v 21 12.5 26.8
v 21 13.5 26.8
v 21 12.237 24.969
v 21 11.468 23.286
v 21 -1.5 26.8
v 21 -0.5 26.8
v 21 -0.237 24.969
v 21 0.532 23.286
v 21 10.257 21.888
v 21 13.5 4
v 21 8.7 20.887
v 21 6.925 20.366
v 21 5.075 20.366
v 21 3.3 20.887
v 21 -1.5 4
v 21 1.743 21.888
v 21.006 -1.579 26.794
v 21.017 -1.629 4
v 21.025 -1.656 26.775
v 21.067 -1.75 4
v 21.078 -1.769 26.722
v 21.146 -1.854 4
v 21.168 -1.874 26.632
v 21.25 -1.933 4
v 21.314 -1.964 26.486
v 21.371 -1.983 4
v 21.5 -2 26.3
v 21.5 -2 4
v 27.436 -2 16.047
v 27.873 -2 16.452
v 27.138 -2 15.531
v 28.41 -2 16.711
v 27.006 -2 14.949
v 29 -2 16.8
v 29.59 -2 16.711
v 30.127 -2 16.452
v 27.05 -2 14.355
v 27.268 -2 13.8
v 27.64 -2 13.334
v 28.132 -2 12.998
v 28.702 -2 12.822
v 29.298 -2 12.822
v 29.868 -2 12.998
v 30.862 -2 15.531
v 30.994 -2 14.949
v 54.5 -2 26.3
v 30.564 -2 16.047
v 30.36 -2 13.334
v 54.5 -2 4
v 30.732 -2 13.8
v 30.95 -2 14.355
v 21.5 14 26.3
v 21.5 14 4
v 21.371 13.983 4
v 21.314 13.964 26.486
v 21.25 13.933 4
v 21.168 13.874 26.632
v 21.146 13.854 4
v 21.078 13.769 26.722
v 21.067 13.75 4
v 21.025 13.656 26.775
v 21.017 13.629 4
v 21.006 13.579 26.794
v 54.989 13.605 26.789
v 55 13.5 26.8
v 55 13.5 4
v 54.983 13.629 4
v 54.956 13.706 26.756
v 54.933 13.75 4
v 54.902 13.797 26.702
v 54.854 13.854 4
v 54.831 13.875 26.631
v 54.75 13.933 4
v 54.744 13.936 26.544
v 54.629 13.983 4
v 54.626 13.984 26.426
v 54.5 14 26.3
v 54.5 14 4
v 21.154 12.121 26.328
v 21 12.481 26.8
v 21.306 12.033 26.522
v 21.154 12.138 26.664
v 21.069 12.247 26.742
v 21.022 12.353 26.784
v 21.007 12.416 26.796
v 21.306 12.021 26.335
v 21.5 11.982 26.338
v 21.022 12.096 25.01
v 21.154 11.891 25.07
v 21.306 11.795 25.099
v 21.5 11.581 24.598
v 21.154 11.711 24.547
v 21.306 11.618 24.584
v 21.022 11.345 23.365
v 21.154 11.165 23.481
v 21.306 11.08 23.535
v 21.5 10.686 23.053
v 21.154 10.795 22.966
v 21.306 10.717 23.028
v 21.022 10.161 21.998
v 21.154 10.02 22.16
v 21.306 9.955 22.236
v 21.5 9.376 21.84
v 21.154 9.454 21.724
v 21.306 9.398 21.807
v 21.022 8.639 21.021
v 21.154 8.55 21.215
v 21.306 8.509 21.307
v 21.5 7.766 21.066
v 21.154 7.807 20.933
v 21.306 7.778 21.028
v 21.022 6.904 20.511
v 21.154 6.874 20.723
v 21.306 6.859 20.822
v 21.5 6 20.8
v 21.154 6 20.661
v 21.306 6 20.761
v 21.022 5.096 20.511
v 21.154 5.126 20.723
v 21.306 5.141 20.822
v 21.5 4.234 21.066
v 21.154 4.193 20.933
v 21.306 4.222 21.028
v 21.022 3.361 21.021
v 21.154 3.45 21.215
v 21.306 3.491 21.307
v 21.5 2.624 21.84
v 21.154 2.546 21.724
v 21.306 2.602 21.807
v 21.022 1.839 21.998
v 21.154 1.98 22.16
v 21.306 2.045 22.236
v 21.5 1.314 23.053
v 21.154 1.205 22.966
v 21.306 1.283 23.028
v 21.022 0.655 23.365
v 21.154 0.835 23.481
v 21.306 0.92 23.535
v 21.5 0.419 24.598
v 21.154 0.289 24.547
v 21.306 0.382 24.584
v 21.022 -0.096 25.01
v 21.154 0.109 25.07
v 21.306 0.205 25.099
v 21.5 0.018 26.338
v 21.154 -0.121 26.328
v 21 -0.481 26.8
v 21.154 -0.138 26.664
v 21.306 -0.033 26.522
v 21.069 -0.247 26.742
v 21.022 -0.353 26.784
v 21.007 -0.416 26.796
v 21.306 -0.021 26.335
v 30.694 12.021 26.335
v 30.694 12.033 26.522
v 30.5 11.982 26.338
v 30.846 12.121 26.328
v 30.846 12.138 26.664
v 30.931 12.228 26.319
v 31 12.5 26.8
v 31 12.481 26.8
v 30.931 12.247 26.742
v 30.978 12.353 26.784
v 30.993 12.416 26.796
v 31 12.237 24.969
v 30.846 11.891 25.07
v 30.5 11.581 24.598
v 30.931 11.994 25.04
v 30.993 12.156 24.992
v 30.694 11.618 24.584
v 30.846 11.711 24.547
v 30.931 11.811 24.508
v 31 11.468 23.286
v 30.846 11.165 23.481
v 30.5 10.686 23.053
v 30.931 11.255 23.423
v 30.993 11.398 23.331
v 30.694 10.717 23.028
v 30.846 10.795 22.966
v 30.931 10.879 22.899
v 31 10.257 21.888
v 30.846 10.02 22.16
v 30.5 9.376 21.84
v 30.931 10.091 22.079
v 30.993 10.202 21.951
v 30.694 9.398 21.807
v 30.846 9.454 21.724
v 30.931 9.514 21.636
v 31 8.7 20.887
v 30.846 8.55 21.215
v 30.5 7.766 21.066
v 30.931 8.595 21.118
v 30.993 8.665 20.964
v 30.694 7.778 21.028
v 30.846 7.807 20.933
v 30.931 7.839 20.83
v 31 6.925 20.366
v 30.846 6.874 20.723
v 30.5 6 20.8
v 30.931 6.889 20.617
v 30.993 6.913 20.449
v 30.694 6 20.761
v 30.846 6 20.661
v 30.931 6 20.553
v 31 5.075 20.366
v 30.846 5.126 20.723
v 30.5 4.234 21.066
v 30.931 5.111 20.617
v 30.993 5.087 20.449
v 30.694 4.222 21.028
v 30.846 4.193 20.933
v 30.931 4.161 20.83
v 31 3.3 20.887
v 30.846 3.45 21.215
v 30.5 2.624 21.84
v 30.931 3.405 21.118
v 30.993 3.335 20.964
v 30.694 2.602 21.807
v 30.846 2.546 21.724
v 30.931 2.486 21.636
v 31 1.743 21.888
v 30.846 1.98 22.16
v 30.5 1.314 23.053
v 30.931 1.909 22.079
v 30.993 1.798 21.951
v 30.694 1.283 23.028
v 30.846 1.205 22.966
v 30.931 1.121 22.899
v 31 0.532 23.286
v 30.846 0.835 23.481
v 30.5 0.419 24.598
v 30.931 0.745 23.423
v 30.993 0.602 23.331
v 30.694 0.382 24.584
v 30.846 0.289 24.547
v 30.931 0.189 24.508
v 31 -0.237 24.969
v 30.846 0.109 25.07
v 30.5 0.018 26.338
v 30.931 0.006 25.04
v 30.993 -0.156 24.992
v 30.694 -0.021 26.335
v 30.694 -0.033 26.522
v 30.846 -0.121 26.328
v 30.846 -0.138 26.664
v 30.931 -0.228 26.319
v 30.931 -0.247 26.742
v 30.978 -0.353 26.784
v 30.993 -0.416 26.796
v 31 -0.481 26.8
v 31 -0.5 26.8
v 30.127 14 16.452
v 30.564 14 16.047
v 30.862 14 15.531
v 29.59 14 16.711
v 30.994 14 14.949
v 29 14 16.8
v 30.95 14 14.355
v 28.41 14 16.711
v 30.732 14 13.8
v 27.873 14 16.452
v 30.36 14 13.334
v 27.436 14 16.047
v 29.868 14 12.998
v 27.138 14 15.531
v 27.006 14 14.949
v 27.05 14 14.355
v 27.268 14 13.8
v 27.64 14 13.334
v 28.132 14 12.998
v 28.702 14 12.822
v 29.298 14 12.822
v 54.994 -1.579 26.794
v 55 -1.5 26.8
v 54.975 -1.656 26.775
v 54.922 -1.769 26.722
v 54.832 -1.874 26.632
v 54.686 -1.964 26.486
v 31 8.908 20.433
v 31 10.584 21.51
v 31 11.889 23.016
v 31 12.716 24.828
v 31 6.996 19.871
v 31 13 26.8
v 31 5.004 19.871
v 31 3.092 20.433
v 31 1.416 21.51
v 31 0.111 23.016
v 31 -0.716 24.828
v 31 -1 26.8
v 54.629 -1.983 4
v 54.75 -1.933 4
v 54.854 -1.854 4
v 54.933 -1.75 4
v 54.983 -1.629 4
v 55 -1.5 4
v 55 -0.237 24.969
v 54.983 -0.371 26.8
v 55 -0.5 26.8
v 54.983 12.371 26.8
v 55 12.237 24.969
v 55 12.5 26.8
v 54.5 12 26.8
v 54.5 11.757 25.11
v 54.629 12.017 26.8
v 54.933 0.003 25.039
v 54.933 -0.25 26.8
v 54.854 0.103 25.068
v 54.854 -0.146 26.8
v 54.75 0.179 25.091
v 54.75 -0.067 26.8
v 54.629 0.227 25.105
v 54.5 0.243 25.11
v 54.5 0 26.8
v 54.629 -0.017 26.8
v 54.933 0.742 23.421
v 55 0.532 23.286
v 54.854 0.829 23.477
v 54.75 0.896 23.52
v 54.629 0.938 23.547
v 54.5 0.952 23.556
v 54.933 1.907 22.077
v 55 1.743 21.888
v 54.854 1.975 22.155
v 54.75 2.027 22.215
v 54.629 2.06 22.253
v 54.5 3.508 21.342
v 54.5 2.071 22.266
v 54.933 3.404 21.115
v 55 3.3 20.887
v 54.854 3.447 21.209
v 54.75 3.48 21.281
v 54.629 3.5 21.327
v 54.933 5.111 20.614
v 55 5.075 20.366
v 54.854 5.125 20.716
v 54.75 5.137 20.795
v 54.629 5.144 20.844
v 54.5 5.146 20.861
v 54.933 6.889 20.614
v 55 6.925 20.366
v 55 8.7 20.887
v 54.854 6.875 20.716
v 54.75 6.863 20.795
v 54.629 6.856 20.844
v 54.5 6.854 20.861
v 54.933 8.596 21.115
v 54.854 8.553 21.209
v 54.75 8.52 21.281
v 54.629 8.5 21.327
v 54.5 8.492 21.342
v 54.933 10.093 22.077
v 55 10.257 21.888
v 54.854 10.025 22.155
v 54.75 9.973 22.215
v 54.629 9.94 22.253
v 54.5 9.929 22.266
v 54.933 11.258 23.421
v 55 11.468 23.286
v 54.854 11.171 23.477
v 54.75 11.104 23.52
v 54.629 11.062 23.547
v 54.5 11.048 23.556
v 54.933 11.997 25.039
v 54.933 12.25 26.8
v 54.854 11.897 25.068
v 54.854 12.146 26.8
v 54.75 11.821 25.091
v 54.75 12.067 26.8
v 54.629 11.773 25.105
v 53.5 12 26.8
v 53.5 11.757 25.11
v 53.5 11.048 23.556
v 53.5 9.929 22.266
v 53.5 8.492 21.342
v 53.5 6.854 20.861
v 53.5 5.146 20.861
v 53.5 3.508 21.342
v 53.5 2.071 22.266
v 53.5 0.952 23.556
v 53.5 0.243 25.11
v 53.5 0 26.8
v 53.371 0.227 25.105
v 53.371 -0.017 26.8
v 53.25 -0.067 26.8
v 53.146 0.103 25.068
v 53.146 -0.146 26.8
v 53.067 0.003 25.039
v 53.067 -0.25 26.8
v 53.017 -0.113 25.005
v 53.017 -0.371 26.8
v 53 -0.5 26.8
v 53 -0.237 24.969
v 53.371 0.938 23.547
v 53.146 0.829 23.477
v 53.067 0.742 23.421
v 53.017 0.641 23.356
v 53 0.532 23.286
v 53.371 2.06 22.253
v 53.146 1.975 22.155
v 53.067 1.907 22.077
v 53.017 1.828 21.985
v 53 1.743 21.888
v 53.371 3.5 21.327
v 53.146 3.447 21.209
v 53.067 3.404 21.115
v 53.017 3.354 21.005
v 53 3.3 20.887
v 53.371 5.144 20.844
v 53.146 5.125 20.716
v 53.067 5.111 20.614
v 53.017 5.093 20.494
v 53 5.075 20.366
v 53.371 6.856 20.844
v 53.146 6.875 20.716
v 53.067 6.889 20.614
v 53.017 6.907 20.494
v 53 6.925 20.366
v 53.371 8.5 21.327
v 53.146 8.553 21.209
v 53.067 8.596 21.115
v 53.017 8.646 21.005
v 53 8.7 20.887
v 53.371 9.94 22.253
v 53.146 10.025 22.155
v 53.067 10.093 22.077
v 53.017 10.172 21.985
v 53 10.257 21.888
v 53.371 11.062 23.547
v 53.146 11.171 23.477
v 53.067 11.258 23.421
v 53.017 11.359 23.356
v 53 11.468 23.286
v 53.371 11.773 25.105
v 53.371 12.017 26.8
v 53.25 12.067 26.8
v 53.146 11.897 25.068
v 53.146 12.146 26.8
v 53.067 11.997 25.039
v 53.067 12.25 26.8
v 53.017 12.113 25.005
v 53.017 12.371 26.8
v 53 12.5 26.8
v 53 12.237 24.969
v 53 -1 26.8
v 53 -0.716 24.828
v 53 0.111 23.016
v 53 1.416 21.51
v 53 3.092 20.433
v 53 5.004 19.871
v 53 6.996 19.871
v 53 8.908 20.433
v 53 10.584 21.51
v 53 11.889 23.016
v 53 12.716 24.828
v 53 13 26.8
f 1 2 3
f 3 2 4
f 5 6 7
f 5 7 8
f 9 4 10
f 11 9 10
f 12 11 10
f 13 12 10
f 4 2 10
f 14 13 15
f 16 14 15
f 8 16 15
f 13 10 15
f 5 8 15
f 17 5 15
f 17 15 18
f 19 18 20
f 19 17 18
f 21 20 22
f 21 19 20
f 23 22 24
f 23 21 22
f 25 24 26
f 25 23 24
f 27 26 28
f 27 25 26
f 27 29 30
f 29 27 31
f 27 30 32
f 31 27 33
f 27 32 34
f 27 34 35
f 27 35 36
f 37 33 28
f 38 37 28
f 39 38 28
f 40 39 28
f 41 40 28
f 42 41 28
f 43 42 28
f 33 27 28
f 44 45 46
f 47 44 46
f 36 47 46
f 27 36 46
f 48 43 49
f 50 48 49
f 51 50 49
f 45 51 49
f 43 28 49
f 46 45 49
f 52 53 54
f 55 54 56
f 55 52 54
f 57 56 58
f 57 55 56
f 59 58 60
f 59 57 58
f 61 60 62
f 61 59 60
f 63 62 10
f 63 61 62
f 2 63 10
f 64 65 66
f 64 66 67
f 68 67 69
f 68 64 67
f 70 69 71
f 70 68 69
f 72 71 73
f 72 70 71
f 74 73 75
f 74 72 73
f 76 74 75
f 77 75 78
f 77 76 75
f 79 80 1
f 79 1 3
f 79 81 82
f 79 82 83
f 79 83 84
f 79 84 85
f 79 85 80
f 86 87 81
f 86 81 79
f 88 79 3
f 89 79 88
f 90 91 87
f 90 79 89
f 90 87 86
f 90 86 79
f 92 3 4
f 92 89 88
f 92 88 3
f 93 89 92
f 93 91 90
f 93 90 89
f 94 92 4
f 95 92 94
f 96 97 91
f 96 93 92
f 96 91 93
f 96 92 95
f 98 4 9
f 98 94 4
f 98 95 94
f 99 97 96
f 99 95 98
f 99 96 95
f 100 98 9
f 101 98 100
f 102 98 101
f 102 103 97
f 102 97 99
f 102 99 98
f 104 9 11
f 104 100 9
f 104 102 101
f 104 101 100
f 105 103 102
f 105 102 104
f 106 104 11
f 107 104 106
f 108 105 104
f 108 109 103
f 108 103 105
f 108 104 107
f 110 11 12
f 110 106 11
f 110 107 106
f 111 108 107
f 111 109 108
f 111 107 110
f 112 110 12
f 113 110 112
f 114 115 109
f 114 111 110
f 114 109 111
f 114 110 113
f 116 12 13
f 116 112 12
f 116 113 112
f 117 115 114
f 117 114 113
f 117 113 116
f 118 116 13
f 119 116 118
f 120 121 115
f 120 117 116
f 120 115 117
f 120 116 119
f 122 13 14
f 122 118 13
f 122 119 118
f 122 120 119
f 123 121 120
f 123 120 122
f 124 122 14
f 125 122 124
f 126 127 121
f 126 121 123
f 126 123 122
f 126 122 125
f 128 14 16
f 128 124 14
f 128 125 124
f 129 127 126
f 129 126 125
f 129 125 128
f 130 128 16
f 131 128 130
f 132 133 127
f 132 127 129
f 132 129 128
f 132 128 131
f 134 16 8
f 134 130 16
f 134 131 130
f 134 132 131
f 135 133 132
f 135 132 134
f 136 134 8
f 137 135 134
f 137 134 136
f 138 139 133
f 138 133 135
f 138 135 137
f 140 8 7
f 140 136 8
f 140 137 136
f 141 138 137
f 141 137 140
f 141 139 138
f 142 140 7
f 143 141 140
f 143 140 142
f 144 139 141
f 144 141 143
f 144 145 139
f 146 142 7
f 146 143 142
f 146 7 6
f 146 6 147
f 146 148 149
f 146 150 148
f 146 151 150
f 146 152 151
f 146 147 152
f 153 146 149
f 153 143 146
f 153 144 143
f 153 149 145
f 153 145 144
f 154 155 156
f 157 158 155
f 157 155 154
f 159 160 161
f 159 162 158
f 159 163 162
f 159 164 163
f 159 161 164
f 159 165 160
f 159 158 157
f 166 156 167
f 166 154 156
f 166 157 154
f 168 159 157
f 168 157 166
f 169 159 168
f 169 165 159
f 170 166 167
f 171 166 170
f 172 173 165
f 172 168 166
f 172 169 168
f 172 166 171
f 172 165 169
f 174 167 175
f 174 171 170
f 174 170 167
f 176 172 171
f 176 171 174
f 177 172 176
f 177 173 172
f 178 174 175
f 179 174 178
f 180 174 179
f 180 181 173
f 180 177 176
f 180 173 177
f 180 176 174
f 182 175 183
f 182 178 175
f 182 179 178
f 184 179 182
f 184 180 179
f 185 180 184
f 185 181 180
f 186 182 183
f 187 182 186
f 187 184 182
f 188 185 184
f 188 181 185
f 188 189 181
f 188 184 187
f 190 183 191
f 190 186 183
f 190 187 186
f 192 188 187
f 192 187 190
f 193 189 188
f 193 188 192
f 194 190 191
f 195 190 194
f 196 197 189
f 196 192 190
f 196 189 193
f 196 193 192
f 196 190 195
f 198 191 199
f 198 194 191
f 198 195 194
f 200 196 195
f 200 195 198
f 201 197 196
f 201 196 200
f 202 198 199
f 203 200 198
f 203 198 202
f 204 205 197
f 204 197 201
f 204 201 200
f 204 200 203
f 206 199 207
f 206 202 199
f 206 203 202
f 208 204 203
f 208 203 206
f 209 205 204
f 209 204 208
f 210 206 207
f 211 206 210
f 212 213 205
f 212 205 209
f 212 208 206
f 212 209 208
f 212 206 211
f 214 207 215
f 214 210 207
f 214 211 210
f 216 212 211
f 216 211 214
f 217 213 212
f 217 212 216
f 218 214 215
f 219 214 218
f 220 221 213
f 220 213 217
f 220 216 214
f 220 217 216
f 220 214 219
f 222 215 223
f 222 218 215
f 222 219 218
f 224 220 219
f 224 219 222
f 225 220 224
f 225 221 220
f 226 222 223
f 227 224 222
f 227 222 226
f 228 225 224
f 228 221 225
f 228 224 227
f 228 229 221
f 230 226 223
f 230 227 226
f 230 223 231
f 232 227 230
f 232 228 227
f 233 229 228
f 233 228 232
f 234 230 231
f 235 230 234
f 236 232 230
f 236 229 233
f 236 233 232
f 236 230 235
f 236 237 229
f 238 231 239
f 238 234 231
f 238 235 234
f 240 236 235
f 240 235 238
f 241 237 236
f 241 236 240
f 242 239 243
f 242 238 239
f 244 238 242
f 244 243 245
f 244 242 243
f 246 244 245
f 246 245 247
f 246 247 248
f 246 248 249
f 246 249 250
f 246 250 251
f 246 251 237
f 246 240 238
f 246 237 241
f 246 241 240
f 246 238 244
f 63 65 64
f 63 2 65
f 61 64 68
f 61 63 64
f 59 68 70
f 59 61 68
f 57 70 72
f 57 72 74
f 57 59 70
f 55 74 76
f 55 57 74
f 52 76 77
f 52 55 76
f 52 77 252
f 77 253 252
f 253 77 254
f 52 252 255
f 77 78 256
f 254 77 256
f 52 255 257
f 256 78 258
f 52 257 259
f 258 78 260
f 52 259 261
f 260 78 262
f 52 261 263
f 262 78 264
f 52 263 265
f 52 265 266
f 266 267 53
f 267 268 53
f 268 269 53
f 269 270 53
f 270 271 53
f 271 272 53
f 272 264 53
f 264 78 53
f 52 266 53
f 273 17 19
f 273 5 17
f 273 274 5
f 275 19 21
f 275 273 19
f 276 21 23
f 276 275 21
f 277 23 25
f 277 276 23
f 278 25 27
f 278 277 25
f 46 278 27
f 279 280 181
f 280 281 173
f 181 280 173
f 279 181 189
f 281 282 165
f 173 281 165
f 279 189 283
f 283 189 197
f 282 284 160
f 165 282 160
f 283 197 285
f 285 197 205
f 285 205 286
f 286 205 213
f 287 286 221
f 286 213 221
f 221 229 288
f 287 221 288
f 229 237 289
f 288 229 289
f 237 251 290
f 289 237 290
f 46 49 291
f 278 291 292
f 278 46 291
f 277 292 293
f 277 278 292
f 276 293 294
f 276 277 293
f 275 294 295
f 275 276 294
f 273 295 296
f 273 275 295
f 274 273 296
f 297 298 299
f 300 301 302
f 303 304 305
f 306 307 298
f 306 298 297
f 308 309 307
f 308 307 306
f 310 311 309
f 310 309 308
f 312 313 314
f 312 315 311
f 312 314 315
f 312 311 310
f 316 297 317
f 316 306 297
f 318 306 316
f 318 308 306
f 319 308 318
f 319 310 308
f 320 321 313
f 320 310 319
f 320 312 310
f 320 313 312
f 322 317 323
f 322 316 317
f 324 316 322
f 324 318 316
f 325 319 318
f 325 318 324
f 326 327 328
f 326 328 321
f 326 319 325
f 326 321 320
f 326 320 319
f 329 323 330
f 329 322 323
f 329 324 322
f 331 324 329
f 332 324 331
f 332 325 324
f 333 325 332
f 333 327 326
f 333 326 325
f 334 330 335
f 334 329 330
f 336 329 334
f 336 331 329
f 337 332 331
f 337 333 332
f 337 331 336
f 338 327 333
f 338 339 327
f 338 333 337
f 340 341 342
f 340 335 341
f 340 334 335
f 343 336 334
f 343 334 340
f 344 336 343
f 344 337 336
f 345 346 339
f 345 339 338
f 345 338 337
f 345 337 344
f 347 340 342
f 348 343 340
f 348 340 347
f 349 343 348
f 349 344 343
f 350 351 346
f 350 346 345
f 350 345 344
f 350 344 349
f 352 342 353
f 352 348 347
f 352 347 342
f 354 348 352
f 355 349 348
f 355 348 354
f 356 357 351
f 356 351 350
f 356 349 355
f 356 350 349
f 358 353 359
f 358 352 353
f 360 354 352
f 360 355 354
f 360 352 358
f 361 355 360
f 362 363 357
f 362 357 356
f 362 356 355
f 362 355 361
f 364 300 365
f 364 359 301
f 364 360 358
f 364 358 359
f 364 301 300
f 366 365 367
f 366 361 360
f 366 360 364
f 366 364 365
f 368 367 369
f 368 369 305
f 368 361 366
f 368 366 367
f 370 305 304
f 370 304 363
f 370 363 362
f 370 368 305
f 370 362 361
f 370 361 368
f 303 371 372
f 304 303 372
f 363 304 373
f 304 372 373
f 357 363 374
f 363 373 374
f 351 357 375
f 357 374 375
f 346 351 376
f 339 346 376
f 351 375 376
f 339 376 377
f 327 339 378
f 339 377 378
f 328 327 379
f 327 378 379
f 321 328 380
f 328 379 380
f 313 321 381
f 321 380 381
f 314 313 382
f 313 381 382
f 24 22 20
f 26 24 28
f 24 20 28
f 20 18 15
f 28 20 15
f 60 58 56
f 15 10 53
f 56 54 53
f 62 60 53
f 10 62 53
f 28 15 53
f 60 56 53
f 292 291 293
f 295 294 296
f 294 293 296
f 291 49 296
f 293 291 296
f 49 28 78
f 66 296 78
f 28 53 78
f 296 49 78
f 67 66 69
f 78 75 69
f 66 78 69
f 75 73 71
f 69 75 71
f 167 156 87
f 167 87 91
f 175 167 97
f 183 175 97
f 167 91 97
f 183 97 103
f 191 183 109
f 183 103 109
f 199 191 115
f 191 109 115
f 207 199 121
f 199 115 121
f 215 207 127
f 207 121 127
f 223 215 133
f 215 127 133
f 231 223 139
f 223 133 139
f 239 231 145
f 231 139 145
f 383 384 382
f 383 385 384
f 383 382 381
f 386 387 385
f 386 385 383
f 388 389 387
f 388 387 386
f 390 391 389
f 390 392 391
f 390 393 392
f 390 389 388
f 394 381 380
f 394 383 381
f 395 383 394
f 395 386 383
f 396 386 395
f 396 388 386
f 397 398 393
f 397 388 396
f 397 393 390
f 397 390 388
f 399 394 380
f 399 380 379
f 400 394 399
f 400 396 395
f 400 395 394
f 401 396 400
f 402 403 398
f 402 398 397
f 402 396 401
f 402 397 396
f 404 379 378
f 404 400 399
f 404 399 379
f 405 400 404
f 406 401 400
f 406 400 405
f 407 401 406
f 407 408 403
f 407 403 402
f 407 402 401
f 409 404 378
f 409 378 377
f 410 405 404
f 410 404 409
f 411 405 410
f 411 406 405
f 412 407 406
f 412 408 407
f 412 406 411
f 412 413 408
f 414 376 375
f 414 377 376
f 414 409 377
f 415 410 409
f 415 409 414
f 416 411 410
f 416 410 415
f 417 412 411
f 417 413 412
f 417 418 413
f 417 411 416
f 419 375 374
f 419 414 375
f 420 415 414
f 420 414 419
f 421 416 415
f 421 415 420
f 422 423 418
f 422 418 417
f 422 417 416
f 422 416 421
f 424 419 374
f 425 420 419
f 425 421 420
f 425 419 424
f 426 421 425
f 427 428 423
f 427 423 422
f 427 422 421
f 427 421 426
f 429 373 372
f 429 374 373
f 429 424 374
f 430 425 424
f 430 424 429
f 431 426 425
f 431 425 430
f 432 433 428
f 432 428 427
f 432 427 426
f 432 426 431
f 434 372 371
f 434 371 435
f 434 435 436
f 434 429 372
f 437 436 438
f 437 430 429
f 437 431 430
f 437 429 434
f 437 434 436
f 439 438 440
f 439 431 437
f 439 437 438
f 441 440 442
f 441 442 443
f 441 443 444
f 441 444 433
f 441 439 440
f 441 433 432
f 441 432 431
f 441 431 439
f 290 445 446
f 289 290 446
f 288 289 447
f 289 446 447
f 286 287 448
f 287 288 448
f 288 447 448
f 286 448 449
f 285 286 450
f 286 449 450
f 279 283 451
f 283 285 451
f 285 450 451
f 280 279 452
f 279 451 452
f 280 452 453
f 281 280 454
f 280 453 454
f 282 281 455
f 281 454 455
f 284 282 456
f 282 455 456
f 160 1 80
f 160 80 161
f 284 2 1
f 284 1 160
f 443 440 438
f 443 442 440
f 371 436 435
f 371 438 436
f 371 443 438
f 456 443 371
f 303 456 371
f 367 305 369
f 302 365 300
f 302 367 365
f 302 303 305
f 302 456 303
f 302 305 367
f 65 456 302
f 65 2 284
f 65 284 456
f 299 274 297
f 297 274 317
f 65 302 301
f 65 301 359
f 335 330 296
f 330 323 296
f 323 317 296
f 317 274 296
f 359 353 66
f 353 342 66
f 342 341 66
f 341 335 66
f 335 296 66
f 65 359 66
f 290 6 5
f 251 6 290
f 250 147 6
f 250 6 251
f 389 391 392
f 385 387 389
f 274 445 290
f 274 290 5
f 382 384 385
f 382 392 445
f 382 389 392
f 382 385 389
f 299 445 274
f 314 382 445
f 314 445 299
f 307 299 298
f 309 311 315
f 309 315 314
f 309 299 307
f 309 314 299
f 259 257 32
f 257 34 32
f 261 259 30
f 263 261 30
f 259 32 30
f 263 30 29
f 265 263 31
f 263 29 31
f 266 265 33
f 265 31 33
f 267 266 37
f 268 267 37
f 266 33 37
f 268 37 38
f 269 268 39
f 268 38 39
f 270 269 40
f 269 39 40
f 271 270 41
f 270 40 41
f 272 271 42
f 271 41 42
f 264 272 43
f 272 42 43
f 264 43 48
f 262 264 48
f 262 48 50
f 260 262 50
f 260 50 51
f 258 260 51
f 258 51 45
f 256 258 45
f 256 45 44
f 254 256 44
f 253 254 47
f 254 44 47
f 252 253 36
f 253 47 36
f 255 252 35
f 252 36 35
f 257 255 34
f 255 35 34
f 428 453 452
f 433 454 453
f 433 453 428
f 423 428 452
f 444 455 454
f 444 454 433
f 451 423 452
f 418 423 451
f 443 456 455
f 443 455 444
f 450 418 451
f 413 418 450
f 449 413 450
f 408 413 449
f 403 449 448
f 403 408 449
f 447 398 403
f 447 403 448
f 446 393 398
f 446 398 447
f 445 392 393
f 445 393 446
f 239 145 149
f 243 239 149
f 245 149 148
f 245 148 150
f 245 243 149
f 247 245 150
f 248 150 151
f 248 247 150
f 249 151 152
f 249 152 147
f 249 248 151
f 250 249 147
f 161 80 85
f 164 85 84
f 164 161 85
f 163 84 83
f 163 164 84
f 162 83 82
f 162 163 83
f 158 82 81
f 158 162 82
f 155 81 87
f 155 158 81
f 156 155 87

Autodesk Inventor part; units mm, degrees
ref_plane "YZ Plane" through (0, 0, 0) normal (1, 0, 0) x (0, 1, 0)
ref_plane "XZ Plane" through (0, 0, 0) normal (0, 1, 0) x (-1, 0, 0)
ref_plane "Work Plane1" through (55, -127.943, -12.5) normal (1, 0, 0) x (0, 0, -1)
ref_plane "Work Plane2" through (2, 0, 0) normal (1, 0, 0) x (0, 1, 0)
ref_plane "Work Plane8" through (55, 3.2, 4) normal (0, 0, 1) x (1, 0, 0)
sketch "SKbody" plane through (55, 3.2, 4) normal (0, 0, 1) x (1, 0, 0)
  line L0 (0, 10.8) -> (-34, 10.8)
  line L1 (-34, -5.2) -> (0, -5.2)
  line L2 (-34, 10.8) -> (-34, -5.2)
  line L3 (0, -5.2) -> (0, 10.8)
  line L4 (0, -2.2986) -> (0, 7.8986)
  point P0 (-13, 2.8)
  point P1 (0, 2.8)
  dimension "d19" = 34
  dimension "d20" = 13
extrude "EXbody" add sketch "SKbody" along normal blind 22.8
ref_plane "Work Plane6" through (21, -2, 4) normal (-1, 0, 0) x (0, 0, 1)
sketch "SKhole1" plane through (21, -2, 4) normal (-1, 0, 0) x (0, 0, 1)
  line L0 (22.8, 16) -> (22.8, 0)
  circle A0 centre (22.8, 8) radius 6
  point P0 (22.8, 2)
  point P1 (22.8, 14)
  dimension "d11" = 12
extrude "EXhole1" cut sketch "SKhole1" against normal through all contours L0 A0 picked at (20.93, 8.7092)
ref_plane "Work Plane5" through (55, 3.2, 26.8) normal (0, 0, 1) x (1, 0, 0)
sketch "SKplaneref" plane through (55, 3.2, 26.8) normal (0, 0, 1) x (1, 0, 0)
  line L0 (0, 8.8) -> (0, -3.2)
  line L1 (0, 2.8) -> (-2, 2.8)
  dimension "d15" = 2
ref_plane "Work Plane3" through (53, 6, 26.8) normal (-1, 0, 0) x (0, -1, 0)
sketch "SKhole2" plane through (53, 6, 26.8) normal (-1, 0, 0) x (0, -1, 0)
  arc A0 (-6, 0) -> (6, 0) centre (0, 0) ccw projected
  circle A1 centre (0, 0) radius 7
  point P0 (6, -26.8)
  dimension "d16" = 14
extrude "EXhole2" cut sketch "SKhole2" along normal blind 22
ref_plane "Work Plane7" through (21, 14, 4) normal (0, 1, 0) x (1, 0, 0)
sketch "SKziptiehole" plane through (21, 14, 4) normal (0, 1, 0) x (1, 0, 0)
  line L0 (34, -22.8) -> (0, -22.8)
  line L1 (0, 0) -> (0, -22.8)
  point P0 (8, -10.8)
  dimension "d42" = 12
  dimension "d43" = 8
hole "Hziptiehole" at (29, 14, 14.8) direction (0, -1, 0) diameter 4 end through all
fillet "Fillet1" radius 0.5 12 edges at (21, 14, 15.4) (38, 14, 26.8) (38, -2, 26.8) (21, -2, 15.4) (55, 14, 15.4) (55, -2, 15.4) (55, 6, 20.8) (21, 6, 20.8) (26, 0, 26.8) (26, 12, 26.8) (53, 6, 20.8) (31, 6, 20.8)
properties part number "thermoMETER_mount"
